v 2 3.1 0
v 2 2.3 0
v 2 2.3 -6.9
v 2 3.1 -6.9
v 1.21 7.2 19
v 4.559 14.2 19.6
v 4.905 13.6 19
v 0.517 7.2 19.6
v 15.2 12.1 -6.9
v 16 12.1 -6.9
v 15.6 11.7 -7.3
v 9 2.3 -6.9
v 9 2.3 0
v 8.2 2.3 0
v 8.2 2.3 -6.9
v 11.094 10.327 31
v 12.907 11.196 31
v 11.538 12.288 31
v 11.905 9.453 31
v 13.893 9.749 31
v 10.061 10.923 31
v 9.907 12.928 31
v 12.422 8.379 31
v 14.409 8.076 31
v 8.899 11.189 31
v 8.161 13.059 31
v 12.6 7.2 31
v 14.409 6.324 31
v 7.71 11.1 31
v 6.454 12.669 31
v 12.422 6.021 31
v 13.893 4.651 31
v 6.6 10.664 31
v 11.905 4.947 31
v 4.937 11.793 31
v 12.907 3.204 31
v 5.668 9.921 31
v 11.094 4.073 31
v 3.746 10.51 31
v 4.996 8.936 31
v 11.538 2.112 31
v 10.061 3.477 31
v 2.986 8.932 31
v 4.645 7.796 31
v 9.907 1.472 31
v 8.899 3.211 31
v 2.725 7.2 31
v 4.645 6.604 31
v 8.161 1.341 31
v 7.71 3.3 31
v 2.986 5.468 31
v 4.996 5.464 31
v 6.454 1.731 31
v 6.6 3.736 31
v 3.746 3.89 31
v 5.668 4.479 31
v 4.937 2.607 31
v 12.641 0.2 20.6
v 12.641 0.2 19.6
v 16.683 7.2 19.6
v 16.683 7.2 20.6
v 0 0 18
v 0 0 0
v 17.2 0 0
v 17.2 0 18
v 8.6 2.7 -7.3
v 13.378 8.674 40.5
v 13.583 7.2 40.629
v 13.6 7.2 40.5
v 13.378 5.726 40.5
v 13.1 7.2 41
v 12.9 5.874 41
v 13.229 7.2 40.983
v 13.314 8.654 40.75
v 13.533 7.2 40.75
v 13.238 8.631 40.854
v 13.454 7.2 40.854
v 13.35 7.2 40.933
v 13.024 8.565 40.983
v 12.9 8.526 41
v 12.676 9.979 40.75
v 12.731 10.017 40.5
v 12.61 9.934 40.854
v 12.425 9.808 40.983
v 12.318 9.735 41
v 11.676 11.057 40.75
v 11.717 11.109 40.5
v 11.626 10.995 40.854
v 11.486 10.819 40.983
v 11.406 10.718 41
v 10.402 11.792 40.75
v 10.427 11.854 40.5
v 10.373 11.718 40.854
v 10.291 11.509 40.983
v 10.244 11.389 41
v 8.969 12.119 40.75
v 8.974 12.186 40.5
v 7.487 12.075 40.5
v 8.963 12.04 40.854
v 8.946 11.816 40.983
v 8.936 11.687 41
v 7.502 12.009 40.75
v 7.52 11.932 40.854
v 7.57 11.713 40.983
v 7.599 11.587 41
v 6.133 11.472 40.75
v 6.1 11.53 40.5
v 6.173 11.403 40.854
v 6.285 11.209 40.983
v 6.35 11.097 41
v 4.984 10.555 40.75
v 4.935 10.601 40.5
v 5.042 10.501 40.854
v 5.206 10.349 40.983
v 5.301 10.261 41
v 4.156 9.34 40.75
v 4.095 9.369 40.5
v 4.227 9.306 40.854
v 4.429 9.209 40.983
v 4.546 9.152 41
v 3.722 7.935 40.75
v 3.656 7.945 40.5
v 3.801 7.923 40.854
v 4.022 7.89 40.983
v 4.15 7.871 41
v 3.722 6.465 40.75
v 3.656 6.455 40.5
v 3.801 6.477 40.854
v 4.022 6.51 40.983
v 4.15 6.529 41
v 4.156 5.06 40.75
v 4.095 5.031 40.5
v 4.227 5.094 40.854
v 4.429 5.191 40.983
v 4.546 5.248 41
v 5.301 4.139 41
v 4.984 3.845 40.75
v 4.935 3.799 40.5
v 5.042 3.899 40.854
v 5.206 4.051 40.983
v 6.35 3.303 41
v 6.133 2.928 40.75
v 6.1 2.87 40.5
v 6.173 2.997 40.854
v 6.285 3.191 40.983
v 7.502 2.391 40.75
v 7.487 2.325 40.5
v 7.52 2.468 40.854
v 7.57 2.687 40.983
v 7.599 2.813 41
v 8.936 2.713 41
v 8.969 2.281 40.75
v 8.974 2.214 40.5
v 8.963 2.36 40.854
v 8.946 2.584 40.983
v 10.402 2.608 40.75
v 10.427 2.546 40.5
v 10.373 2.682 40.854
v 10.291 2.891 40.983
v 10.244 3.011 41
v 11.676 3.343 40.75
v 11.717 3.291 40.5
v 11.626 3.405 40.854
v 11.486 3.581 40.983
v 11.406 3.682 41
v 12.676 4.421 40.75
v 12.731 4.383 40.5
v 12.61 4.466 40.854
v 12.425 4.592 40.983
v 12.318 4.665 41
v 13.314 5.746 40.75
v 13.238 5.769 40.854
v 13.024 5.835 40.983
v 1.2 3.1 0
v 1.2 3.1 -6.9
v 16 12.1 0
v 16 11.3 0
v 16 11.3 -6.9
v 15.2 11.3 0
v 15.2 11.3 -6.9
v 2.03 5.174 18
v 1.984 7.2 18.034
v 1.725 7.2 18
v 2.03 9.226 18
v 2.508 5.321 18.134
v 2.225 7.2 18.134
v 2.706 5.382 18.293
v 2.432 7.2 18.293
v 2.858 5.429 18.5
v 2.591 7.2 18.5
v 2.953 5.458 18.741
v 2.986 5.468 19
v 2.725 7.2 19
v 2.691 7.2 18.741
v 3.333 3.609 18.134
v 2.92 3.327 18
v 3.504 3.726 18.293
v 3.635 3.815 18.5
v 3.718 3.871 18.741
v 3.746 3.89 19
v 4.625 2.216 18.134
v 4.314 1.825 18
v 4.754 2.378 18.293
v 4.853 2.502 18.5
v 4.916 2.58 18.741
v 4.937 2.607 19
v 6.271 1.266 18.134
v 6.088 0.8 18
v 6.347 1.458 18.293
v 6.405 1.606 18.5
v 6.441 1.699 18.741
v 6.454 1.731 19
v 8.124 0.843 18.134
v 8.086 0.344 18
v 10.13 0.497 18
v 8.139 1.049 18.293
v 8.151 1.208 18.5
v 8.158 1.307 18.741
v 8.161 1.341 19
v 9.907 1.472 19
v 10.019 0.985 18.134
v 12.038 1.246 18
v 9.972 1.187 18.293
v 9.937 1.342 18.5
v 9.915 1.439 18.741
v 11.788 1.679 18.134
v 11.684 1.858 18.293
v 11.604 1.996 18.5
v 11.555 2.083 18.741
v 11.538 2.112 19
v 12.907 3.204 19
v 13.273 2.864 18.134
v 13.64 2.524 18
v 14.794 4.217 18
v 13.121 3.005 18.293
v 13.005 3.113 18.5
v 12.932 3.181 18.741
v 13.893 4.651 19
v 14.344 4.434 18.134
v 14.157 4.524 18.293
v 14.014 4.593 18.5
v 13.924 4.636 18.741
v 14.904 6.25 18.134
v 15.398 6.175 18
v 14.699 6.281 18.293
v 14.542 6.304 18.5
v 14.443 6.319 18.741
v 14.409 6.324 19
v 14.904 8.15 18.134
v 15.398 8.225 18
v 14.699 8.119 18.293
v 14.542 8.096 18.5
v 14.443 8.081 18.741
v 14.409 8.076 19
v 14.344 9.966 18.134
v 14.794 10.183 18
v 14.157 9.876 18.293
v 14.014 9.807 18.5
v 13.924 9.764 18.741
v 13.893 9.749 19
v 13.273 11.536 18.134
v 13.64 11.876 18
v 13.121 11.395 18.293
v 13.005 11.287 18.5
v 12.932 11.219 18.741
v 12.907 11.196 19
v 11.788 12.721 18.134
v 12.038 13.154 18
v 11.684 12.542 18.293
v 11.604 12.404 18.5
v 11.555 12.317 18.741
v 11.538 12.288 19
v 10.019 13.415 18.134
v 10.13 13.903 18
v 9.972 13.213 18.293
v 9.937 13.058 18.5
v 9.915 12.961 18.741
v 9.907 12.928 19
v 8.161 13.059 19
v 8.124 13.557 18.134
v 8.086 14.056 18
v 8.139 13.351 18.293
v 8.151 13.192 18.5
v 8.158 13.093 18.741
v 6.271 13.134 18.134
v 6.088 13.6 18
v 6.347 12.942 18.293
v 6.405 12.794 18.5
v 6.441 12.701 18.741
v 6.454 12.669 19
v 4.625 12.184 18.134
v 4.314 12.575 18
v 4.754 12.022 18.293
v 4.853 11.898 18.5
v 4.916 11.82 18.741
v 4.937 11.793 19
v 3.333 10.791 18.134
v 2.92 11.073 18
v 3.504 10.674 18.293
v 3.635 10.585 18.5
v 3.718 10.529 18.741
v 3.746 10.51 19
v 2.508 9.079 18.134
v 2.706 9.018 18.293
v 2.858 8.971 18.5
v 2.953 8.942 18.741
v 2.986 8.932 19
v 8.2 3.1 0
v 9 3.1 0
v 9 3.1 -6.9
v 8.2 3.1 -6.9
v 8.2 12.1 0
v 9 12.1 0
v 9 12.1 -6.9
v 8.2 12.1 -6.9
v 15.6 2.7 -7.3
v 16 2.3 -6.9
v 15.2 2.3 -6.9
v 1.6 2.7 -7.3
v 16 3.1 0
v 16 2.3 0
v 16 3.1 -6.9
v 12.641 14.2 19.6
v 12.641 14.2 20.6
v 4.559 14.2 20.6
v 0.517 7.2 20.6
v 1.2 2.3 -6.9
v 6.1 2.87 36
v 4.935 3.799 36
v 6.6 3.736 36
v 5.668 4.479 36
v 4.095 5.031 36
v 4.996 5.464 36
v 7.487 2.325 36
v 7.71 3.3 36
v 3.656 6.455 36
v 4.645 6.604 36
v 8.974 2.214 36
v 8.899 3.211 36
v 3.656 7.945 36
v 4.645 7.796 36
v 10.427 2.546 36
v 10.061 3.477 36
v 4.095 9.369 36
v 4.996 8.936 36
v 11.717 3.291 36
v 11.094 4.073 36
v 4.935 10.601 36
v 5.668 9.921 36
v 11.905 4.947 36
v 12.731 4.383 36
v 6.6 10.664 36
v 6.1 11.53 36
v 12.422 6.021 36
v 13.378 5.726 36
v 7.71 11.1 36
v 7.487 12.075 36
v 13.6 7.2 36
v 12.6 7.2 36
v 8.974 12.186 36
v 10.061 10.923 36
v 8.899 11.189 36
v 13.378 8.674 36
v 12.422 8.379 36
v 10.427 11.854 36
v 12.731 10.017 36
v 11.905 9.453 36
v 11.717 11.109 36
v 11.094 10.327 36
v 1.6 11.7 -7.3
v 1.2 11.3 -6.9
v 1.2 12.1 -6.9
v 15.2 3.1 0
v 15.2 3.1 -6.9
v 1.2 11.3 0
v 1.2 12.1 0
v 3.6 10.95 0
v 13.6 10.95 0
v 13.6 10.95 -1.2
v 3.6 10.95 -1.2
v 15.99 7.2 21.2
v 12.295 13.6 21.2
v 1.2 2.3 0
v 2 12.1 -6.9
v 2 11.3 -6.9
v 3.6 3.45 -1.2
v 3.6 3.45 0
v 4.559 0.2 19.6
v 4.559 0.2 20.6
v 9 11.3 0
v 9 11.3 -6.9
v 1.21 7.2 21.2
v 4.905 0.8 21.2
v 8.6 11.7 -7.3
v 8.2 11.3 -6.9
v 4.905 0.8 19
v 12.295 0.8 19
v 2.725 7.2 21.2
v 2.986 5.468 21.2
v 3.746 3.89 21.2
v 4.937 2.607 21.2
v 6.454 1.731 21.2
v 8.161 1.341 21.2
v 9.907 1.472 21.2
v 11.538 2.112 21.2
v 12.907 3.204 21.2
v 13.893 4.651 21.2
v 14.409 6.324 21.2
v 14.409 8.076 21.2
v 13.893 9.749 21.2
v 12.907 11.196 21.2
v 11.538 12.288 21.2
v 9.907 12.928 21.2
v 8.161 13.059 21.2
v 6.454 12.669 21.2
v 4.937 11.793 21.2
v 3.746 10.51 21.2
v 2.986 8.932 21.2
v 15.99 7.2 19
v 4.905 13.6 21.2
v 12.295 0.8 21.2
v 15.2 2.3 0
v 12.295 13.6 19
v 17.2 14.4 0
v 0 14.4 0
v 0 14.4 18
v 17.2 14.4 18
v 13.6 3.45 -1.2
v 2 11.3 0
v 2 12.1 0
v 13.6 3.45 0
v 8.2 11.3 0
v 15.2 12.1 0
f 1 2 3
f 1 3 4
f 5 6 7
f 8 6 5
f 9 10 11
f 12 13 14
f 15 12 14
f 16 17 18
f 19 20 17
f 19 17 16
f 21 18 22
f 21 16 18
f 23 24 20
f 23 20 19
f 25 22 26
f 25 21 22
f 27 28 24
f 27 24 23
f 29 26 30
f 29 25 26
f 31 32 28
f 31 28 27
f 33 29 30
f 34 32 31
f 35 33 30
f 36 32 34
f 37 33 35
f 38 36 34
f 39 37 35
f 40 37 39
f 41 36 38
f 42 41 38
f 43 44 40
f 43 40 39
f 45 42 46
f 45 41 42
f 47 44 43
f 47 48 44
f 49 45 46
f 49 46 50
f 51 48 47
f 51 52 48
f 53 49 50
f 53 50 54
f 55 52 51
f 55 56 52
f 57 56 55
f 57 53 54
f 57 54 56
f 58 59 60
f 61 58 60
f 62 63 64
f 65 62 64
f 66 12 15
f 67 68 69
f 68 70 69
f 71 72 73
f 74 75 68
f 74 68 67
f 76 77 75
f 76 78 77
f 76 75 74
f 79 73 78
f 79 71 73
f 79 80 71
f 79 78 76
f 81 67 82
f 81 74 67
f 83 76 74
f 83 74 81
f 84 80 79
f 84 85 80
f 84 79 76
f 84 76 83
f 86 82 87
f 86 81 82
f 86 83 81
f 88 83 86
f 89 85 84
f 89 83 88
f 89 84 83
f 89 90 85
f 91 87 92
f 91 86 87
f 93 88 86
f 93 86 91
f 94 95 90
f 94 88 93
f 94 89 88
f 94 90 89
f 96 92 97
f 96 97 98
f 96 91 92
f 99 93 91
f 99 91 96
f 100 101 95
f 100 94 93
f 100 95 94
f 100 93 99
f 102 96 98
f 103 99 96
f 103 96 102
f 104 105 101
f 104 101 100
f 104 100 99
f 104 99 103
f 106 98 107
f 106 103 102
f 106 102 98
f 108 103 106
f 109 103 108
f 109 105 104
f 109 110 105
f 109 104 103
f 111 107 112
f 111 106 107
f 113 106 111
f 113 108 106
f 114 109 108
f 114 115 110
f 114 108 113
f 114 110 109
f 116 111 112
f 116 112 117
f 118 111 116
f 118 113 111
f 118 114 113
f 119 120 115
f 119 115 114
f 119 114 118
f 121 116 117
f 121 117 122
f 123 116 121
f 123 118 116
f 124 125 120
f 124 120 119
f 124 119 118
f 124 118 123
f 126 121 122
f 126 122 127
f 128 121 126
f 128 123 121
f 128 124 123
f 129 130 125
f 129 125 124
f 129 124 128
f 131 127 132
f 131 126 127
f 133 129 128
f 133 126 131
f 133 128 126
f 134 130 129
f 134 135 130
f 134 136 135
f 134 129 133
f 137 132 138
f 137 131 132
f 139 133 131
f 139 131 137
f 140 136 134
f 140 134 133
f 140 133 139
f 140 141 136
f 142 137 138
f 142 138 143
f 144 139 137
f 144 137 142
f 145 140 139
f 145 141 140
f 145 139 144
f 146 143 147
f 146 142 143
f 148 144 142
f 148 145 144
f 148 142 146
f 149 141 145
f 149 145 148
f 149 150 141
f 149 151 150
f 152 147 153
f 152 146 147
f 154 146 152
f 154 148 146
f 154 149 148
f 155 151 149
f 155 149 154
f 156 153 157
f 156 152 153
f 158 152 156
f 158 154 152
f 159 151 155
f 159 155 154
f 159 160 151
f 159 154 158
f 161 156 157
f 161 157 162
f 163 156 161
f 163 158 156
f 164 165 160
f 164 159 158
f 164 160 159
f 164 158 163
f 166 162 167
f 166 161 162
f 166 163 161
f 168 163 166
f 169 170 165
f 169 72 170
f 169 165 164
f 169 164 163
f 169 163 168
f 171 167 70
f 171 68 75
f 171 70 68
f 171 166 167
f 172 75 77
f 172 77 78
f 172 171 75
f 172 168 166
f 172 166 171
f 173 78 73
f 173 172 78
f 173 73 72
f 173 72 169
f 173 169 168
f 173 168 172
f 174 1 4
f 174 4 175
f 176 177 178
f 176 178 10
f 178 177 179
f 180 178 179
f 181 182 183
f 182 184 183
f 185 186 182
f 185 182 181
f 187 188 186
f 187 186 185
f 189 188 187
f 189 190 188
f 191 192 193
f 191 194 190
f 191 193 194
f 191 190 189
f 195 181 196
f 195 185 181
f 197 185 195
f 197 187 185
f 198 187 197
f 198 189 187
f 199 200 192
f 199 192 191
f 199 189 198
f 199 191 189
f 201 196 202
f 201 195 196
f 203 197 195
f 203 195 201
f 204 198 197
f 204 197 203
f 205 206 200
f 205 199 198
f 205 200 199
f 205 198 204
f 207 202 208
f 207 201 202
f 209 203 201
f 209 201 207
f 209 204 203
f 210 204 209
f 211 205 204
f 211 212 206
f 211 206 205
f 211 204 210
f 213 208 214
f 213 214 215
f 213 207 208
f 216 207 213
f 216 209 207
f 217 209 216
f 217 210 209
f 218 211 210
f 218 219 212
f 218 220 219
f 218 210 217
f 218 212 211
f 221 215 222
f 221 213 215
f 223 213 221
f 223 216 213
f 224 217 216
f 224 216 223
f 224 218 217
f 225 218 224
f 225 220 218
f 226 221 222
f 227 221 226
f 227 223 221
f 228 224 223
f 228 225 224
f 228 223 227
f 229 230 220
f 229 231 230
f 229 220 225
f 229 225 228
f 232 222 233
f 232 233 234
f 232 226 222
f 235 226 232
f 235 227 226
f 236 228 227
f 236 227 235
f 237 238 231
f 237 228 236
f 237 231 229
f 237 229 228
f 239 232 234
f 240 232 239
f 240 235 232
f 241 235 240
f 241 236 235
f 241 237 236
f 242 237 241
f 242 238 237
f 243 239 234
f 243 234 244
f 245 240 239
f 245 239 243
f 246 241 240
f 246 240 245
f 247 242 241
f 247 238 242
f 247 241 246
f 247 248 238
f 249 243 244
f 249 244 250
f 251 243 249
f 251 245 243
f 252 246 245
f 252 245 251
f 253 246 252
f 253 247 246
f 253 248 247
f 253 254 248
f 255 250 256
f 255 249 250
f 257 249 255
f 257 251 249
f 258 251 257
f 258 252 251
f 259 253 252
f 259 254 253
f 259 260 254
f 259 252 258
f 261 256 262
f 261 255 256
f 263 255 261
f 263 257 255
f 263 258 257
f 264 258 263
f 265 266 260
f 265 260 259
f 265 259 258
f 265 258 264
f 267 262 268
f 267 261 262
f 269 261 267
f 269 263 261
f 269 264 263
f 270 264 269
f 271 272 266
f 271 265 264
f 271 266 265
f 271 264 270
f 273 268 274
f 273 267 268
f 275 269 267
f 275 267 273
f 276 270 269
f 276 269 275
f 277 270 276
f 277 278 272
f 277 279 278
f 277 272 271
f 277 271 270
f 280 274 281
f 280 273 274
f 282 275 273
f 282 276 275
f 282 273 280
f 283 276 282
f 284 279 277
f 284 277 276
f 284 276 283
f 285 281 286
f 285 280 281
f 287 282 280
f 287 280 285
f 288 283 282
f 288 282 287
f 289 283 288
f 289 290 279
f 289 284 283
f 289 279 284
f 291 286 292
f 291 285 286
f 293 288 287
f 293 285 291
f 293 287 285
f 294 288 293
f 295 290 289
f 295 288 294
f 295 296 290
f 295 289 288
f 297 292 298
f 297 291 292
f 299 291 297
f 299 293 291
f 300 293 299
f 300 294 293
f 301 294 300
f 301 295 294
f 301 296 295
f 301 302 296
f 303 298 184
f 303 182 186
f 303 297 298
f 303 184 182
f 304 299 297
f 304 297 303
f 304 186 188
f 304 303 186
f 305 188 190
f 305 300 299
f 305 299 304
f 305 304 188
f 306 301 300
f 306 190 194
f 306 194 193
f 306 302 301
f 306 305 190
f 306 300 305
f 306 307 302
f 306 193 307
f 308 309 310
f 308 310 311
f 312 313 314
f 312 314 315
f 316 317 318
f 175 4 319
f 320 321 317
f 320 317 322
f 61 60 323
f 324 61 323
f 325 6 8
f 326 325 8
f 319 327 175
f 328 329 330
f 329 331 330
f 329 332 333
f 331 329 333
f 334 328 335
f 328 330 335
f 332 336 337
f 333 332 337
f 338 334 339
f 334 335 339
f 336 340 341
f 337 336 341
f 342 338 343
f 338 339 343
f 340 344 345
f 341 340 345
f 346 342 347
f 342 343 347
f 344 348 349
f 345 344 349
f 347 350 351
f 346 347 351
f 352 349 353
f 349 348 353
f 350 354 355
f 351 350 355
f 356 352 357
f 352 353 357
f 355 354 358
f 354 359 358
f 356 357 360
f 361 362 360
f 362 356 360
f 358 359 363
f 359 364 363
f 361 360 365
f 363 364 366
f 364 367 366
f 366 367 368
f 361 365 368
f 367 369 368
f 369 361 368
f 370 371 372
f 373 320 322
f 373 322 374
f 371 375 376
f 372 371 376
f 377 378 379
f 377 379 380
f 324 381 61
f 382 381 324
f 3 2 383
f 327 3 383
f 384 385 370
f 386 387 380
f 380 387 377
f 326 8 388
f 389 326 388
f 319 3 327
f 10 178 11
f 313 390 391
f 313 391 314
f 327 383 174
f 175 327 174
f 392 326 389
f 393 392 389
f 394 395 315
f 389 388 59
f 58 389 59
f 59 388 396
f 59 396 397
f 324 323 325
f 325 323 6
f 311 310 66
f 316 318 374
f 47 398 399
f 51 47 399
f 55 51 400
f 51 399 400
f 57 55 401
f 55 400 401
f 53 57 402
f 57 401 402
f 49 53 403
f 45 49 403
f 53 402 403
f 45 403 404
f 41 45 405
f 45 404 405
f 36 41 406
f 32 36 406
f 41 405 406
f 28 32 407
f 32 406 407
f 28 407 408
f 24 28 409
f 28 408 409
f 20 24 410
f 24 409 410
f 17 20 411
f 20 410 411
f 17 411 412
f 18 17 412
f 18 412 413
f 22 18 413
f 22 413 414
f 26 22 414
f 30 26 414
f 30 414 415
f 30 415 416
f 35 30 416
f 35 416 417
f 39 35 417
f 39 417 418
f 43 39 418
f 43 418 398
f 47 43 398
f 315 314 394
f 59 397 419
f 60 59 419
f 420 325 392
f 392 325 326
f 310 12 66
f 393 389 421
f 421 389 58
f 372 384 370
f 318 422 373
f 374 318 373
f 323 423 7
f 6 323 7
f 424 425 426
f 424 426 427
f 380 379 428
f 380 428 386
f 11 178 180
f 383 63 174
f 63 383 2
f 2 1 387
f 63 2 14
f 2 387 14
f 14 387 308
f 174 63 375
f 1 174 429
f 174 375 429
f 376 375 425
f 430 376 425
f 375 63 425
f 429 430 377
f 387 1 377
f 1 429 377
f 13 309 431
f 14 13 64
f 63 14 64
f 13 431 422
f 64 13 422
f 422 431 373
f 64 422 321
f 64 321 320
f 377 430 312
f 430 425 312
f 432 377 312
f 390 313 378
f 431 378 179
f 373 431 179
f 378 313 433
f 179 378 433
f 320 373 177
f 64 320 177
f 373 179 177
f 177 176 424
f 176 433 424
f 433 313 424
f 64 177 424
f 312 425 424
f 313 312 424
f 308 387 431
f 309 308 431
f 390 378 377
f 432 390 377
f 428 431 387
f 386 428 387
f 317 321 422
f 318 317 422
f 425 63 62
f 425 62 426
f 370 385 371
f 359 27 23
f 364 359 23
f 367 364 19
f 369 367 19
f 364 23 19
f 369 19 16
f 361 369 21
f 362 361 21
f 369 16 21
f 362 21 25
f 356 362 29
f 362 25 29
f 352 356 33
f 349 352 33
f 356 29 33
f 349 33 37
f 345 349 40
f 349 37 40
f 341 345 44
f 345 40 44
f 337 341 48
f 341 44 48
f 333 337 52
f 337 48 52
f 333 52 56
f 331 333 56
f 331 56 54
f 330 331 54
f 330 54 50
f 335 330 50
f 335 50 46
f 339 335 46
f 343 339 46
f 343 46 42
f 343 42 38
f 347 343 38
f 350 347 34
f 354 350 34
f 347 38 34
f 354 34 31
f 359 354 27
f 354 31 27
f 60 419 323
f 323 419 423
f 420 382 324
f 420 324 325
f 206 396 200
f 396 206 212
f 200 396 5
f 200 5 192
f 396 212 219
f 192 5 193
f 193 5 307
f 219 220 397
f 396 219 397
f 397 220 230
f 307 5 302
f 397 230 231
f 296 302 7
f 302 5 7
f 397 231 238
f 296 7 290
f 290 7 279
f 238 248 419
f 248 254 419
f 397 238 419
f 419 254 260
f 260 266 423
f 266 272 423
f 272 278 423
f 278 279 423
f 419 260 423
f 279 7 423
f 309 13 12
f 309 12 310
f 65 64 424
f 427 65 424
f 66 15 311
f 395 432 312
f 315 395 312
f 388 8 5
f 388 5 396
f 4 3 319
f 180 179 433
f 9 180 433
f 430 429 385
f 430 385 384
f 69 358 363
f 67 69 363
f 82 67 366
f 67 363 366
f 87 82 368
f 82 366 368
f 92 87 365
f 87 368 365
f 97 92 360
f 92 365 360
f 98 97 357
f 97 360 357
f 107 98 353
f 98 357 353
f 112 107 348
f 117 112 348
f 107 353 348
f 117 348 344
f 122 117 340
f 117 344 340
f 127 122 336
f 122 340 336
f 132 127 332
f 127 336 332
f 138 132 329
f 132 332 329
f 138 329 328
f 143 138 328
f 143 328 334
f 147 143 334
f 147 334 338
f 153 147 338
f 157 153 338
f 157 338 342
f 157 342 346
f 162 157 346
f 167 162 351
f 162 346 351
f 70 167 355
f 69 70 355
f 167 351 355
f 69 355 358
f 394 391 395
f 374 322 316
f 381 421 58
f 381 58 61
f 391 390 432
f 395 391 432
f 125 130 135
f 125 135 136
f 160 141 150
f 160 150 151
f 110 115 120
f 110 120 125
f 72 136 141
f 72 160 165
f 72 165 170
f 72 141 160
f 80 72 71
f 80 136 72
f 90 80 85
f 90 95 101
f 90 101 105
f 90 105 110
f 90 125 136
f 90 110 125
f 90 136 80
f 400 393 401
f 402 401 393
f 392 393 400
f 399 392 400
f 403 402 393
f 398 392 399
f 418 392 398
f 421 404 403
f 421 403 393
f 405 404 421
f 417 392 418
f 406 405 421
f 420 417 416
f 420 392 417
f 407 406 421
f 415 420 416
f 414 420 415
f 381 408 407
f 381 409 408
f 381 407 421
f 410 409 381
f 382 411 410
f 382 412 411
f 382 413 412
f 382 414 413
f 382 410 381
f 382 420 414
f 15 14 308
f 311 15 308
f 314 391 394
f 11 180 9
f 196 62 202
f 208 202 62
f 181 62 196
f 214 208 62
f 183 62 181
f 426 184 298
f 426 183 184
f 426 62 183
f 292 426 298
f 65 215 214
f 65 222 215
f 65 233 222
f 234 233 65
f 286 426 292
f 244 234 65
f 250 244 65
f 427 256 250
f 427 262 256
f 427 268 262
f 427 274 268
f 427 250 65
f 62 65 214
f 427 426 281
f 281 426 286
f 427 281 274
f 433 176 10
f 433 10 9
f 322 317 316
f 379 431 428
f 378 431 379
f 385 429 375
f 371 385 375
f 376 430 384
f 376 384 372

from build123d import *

# Parameters (mm, degrees)
SKETCH1_W                  = 17.2
SKETCH1_H                  = 14.4
BOSS_EXTRUDE1_DEPTH        = 18
SKETCH2_R                  = 5.875
BOSS_EXTRUDE2_DEPTH        = 13
SKETCH3_R                  = 4
BOSS_EXTRUDE3_DEPTH        = 5
SKETCH4_R                  = 5
BOSS_EXTRUDE4_DEPTH        = 5
SKETCH5_W                  = 10
SKETCH5_H                  = 7.5
BOSS_EXTRUDE5_DEPTH        = 1.2
SKETCH6_W                  = 0.8
SKETCH6_H                  = 0.8
BOSS_EXTRUDE6_DEPTH        = 7.3
CHAMFER1_SIZE              = 0.4
FILLET1_R                  = 1
FILLET2_R                  = 0.5
SKETCH7_R                  = 5.875
BOSS_EXTRUDE7_DEPTH        = 2.2
CHAMFER2_SIZE              = 0.6
LPATTERN1_COUNT            = 3
LPATTERN1_PITCH            = 7
LPATTERN1_COUNT_DIR2       = 2
LPATTERN1_PITCH_DIR2       = 9
CHAMFER1_OF_LPATTERN1_SIZE = 0.4


with BuildPart() as part:
    # Sketch1 → Boss-Extrude1 (new body)
    with BuildSketch(Plane.XY):
        with Locations((8.6, 7.2)):
            Rectangle(SKETCH1_W, SKETCH1_H)
    extrude(amount=BOSS_EXTRUDE1_DEPTH)

    # Sketch2 → Boss-Extrude2 (add)
    with BuildSketch(Plane.XY.offset(18)):
        with Locations(Location((8.6, 7.2, 0), (0, 0, 180))):
            Circle(SKETCH2_R)
    extrude(amount=BOSS_EXTRUDE2_DEPTH)

    # Sketch3 → Boss-Extrude3 (add)
    with BuildSketch(Plane.XY.offset(31)):
        with Locations((8.6, 7.2)):
            Circle(SKETCH3_R)
    extrude(amount=BOSS_EXTRUDE3_DEPTH)

    # Sketch4 → Boss-Extrude4 (add)
    with BuildSketch(Plane.XY.offset(36)):
        with Locations((8.6, 7.2)):
            Circle(SKETCH4_R)
    extrude(amount=BOSS_EXTRUDE4_DEPTH)

    # Sketch5 → Boss-Extrude5 (add)
    with BuildSketch(Plane(origin=(0, 0, 0), x_dir=(-1, 0, 0), z_dir=(0, 0, -1))):
        with Locations((-8.6, 7.2)):
            Rectangle(SKETCH5_W, SKETCH5_H)
    extrude(amount=BOSS_EXTRUDE5_DEPTH)

    # Sketch6 → Boss-Extrude6 (add)
    with BuildSketch(Plane(origin=(0, 0, 0), x_dir=(-1, 0, 0), z_dir=(0, 0, -1))):
        with Locations((-15.6, 11.7)):
            Rectangle(SKETCH6_W, SKETCH6_H)
    boss_extrude6 = extrude(amount=BOSS_EXTRUDE6_DEPTH)

    # Chamfer1
    chamfer1_edges = [part.edges().sort_by_distance(p)[0] for p in [
        (15.2, 11.7, -7.3),
        (15.6, 12.1, -7.3),
        (16, 11.7, -7.3),
        (15.6, 11.3, -7.3),
    ]]
    chamfer(chamfer1_edges, length=CHAMFER1_SIZE - 0.0001)  # a hair under: the kernel refuses the full size

    # Fillet1
    fillet1_edges = [part.edges().sort_by_distance(p)[0] for p in [
        (14.475, 7.2, 18),
    ]]
    fillet(fillet1_edges, radius=FILLET1_R)

    # Fillet2
    fillet2_edges = [part.edges().sort_by_distance(p)[0] for p in [
        (3.6, 7.2, 41),
    ]]
    fillet(fillet2_edges, radius=FILLET2_R)

    # Sketch7 → Boss-Extrude7 (add)
    with BuildSketch(Plane.XY.offset(19)):
        Polygon((16.682903769, 7.2), (12.641451884, 14.2), (4.558548116, 14.2), (0.517096231, 7.2), (4.558548116, 0.2), (12.641451884, 0.2), align=None)
        with Locations(Location((8.6, 7.2, 0), (0, 0, 180))):
            Circle(SKETCH7_R, mode=Mode.SUBTRACT)
    extrude(amount=BOSS_EXTRUDE7_DEPTH)

    # Chamfer2
    chamfer2_edges = [part.edges().sort_by_distance(p)[0] for p in [
        (14.662177826, 3.7, 21.2),
        (14.662177826, 10.7, 21.2),
        (8.6, 14.2, 21.2),
        (2.537822174, 10.7, 21.2),
        (2.537822174, 3.7, 21.2),
        (8.6, 0.2, 21.2),
        (14.662177826, 3.7, 19),
        (14.662177826, 10.7, 19),
        (8.6, 14.2, 19),
        (2.537822174, 10.7, 19),
        (2.537822174, 3.7, 19),
        (8.6, 0.2, 19),
    ]]
    chamfer(chamfer2_edges, length=CHAMFER2_SIZE)

    # LPattern1: Boss-Extrude6 3 × 2
    with Locations(*[(-i * LPATTERN1_PITCH, -j * LPATTERN1_PITCH_DIR2, 0) for i in range(LPATTERN1_COUNT) for j in range(LPATTERN1_COUNT_DIR2) if (i, j) != (0, 0)]):
        add(boss_extrude6)

    # Chamfer1 of LPattern1
    chamfer1_of_lpattern1_edges = [part.edges().sort_by_distance(p)[0] for p in [
        (15.2, 2.7, -7.3),
        (15.6, 3.1, -7.3),
        (16, 2.7, -7.3),
        (15.6, 2.3, -7.3),
        (8.2, 11.7, -7.3),
        (8.6, 12.1, -7.3),
        (9, 11.7, -7.3),
        (8.6, 11.3, -7.3),
        (8.2, 2.7, -7.3),
        (8.6, 3.1, -7.3),
        (9, 2.7, -7.3),
        (8.6, 2.3, -7.3),
        (1.2, 11.7, -7.3),
        (1.6, 12.1, -7.3),
        (2, 11.7, -7.3),
        (1.6, 11.3, -7.3),
        (1.2, 2.7, -7.3),
        (1.6, 3.1, -7.3),
        (2, 2.7, -7.3),
        (1.6, 2.3, -7.3),
    ]]
    chamfer(chamfer1_of_lpattern1_edges, length=CHAMFER1_OF_LPATTERN1_SIZE - 0.0001)  # a hair under: the kernel refuses the full size


solid = part.part
